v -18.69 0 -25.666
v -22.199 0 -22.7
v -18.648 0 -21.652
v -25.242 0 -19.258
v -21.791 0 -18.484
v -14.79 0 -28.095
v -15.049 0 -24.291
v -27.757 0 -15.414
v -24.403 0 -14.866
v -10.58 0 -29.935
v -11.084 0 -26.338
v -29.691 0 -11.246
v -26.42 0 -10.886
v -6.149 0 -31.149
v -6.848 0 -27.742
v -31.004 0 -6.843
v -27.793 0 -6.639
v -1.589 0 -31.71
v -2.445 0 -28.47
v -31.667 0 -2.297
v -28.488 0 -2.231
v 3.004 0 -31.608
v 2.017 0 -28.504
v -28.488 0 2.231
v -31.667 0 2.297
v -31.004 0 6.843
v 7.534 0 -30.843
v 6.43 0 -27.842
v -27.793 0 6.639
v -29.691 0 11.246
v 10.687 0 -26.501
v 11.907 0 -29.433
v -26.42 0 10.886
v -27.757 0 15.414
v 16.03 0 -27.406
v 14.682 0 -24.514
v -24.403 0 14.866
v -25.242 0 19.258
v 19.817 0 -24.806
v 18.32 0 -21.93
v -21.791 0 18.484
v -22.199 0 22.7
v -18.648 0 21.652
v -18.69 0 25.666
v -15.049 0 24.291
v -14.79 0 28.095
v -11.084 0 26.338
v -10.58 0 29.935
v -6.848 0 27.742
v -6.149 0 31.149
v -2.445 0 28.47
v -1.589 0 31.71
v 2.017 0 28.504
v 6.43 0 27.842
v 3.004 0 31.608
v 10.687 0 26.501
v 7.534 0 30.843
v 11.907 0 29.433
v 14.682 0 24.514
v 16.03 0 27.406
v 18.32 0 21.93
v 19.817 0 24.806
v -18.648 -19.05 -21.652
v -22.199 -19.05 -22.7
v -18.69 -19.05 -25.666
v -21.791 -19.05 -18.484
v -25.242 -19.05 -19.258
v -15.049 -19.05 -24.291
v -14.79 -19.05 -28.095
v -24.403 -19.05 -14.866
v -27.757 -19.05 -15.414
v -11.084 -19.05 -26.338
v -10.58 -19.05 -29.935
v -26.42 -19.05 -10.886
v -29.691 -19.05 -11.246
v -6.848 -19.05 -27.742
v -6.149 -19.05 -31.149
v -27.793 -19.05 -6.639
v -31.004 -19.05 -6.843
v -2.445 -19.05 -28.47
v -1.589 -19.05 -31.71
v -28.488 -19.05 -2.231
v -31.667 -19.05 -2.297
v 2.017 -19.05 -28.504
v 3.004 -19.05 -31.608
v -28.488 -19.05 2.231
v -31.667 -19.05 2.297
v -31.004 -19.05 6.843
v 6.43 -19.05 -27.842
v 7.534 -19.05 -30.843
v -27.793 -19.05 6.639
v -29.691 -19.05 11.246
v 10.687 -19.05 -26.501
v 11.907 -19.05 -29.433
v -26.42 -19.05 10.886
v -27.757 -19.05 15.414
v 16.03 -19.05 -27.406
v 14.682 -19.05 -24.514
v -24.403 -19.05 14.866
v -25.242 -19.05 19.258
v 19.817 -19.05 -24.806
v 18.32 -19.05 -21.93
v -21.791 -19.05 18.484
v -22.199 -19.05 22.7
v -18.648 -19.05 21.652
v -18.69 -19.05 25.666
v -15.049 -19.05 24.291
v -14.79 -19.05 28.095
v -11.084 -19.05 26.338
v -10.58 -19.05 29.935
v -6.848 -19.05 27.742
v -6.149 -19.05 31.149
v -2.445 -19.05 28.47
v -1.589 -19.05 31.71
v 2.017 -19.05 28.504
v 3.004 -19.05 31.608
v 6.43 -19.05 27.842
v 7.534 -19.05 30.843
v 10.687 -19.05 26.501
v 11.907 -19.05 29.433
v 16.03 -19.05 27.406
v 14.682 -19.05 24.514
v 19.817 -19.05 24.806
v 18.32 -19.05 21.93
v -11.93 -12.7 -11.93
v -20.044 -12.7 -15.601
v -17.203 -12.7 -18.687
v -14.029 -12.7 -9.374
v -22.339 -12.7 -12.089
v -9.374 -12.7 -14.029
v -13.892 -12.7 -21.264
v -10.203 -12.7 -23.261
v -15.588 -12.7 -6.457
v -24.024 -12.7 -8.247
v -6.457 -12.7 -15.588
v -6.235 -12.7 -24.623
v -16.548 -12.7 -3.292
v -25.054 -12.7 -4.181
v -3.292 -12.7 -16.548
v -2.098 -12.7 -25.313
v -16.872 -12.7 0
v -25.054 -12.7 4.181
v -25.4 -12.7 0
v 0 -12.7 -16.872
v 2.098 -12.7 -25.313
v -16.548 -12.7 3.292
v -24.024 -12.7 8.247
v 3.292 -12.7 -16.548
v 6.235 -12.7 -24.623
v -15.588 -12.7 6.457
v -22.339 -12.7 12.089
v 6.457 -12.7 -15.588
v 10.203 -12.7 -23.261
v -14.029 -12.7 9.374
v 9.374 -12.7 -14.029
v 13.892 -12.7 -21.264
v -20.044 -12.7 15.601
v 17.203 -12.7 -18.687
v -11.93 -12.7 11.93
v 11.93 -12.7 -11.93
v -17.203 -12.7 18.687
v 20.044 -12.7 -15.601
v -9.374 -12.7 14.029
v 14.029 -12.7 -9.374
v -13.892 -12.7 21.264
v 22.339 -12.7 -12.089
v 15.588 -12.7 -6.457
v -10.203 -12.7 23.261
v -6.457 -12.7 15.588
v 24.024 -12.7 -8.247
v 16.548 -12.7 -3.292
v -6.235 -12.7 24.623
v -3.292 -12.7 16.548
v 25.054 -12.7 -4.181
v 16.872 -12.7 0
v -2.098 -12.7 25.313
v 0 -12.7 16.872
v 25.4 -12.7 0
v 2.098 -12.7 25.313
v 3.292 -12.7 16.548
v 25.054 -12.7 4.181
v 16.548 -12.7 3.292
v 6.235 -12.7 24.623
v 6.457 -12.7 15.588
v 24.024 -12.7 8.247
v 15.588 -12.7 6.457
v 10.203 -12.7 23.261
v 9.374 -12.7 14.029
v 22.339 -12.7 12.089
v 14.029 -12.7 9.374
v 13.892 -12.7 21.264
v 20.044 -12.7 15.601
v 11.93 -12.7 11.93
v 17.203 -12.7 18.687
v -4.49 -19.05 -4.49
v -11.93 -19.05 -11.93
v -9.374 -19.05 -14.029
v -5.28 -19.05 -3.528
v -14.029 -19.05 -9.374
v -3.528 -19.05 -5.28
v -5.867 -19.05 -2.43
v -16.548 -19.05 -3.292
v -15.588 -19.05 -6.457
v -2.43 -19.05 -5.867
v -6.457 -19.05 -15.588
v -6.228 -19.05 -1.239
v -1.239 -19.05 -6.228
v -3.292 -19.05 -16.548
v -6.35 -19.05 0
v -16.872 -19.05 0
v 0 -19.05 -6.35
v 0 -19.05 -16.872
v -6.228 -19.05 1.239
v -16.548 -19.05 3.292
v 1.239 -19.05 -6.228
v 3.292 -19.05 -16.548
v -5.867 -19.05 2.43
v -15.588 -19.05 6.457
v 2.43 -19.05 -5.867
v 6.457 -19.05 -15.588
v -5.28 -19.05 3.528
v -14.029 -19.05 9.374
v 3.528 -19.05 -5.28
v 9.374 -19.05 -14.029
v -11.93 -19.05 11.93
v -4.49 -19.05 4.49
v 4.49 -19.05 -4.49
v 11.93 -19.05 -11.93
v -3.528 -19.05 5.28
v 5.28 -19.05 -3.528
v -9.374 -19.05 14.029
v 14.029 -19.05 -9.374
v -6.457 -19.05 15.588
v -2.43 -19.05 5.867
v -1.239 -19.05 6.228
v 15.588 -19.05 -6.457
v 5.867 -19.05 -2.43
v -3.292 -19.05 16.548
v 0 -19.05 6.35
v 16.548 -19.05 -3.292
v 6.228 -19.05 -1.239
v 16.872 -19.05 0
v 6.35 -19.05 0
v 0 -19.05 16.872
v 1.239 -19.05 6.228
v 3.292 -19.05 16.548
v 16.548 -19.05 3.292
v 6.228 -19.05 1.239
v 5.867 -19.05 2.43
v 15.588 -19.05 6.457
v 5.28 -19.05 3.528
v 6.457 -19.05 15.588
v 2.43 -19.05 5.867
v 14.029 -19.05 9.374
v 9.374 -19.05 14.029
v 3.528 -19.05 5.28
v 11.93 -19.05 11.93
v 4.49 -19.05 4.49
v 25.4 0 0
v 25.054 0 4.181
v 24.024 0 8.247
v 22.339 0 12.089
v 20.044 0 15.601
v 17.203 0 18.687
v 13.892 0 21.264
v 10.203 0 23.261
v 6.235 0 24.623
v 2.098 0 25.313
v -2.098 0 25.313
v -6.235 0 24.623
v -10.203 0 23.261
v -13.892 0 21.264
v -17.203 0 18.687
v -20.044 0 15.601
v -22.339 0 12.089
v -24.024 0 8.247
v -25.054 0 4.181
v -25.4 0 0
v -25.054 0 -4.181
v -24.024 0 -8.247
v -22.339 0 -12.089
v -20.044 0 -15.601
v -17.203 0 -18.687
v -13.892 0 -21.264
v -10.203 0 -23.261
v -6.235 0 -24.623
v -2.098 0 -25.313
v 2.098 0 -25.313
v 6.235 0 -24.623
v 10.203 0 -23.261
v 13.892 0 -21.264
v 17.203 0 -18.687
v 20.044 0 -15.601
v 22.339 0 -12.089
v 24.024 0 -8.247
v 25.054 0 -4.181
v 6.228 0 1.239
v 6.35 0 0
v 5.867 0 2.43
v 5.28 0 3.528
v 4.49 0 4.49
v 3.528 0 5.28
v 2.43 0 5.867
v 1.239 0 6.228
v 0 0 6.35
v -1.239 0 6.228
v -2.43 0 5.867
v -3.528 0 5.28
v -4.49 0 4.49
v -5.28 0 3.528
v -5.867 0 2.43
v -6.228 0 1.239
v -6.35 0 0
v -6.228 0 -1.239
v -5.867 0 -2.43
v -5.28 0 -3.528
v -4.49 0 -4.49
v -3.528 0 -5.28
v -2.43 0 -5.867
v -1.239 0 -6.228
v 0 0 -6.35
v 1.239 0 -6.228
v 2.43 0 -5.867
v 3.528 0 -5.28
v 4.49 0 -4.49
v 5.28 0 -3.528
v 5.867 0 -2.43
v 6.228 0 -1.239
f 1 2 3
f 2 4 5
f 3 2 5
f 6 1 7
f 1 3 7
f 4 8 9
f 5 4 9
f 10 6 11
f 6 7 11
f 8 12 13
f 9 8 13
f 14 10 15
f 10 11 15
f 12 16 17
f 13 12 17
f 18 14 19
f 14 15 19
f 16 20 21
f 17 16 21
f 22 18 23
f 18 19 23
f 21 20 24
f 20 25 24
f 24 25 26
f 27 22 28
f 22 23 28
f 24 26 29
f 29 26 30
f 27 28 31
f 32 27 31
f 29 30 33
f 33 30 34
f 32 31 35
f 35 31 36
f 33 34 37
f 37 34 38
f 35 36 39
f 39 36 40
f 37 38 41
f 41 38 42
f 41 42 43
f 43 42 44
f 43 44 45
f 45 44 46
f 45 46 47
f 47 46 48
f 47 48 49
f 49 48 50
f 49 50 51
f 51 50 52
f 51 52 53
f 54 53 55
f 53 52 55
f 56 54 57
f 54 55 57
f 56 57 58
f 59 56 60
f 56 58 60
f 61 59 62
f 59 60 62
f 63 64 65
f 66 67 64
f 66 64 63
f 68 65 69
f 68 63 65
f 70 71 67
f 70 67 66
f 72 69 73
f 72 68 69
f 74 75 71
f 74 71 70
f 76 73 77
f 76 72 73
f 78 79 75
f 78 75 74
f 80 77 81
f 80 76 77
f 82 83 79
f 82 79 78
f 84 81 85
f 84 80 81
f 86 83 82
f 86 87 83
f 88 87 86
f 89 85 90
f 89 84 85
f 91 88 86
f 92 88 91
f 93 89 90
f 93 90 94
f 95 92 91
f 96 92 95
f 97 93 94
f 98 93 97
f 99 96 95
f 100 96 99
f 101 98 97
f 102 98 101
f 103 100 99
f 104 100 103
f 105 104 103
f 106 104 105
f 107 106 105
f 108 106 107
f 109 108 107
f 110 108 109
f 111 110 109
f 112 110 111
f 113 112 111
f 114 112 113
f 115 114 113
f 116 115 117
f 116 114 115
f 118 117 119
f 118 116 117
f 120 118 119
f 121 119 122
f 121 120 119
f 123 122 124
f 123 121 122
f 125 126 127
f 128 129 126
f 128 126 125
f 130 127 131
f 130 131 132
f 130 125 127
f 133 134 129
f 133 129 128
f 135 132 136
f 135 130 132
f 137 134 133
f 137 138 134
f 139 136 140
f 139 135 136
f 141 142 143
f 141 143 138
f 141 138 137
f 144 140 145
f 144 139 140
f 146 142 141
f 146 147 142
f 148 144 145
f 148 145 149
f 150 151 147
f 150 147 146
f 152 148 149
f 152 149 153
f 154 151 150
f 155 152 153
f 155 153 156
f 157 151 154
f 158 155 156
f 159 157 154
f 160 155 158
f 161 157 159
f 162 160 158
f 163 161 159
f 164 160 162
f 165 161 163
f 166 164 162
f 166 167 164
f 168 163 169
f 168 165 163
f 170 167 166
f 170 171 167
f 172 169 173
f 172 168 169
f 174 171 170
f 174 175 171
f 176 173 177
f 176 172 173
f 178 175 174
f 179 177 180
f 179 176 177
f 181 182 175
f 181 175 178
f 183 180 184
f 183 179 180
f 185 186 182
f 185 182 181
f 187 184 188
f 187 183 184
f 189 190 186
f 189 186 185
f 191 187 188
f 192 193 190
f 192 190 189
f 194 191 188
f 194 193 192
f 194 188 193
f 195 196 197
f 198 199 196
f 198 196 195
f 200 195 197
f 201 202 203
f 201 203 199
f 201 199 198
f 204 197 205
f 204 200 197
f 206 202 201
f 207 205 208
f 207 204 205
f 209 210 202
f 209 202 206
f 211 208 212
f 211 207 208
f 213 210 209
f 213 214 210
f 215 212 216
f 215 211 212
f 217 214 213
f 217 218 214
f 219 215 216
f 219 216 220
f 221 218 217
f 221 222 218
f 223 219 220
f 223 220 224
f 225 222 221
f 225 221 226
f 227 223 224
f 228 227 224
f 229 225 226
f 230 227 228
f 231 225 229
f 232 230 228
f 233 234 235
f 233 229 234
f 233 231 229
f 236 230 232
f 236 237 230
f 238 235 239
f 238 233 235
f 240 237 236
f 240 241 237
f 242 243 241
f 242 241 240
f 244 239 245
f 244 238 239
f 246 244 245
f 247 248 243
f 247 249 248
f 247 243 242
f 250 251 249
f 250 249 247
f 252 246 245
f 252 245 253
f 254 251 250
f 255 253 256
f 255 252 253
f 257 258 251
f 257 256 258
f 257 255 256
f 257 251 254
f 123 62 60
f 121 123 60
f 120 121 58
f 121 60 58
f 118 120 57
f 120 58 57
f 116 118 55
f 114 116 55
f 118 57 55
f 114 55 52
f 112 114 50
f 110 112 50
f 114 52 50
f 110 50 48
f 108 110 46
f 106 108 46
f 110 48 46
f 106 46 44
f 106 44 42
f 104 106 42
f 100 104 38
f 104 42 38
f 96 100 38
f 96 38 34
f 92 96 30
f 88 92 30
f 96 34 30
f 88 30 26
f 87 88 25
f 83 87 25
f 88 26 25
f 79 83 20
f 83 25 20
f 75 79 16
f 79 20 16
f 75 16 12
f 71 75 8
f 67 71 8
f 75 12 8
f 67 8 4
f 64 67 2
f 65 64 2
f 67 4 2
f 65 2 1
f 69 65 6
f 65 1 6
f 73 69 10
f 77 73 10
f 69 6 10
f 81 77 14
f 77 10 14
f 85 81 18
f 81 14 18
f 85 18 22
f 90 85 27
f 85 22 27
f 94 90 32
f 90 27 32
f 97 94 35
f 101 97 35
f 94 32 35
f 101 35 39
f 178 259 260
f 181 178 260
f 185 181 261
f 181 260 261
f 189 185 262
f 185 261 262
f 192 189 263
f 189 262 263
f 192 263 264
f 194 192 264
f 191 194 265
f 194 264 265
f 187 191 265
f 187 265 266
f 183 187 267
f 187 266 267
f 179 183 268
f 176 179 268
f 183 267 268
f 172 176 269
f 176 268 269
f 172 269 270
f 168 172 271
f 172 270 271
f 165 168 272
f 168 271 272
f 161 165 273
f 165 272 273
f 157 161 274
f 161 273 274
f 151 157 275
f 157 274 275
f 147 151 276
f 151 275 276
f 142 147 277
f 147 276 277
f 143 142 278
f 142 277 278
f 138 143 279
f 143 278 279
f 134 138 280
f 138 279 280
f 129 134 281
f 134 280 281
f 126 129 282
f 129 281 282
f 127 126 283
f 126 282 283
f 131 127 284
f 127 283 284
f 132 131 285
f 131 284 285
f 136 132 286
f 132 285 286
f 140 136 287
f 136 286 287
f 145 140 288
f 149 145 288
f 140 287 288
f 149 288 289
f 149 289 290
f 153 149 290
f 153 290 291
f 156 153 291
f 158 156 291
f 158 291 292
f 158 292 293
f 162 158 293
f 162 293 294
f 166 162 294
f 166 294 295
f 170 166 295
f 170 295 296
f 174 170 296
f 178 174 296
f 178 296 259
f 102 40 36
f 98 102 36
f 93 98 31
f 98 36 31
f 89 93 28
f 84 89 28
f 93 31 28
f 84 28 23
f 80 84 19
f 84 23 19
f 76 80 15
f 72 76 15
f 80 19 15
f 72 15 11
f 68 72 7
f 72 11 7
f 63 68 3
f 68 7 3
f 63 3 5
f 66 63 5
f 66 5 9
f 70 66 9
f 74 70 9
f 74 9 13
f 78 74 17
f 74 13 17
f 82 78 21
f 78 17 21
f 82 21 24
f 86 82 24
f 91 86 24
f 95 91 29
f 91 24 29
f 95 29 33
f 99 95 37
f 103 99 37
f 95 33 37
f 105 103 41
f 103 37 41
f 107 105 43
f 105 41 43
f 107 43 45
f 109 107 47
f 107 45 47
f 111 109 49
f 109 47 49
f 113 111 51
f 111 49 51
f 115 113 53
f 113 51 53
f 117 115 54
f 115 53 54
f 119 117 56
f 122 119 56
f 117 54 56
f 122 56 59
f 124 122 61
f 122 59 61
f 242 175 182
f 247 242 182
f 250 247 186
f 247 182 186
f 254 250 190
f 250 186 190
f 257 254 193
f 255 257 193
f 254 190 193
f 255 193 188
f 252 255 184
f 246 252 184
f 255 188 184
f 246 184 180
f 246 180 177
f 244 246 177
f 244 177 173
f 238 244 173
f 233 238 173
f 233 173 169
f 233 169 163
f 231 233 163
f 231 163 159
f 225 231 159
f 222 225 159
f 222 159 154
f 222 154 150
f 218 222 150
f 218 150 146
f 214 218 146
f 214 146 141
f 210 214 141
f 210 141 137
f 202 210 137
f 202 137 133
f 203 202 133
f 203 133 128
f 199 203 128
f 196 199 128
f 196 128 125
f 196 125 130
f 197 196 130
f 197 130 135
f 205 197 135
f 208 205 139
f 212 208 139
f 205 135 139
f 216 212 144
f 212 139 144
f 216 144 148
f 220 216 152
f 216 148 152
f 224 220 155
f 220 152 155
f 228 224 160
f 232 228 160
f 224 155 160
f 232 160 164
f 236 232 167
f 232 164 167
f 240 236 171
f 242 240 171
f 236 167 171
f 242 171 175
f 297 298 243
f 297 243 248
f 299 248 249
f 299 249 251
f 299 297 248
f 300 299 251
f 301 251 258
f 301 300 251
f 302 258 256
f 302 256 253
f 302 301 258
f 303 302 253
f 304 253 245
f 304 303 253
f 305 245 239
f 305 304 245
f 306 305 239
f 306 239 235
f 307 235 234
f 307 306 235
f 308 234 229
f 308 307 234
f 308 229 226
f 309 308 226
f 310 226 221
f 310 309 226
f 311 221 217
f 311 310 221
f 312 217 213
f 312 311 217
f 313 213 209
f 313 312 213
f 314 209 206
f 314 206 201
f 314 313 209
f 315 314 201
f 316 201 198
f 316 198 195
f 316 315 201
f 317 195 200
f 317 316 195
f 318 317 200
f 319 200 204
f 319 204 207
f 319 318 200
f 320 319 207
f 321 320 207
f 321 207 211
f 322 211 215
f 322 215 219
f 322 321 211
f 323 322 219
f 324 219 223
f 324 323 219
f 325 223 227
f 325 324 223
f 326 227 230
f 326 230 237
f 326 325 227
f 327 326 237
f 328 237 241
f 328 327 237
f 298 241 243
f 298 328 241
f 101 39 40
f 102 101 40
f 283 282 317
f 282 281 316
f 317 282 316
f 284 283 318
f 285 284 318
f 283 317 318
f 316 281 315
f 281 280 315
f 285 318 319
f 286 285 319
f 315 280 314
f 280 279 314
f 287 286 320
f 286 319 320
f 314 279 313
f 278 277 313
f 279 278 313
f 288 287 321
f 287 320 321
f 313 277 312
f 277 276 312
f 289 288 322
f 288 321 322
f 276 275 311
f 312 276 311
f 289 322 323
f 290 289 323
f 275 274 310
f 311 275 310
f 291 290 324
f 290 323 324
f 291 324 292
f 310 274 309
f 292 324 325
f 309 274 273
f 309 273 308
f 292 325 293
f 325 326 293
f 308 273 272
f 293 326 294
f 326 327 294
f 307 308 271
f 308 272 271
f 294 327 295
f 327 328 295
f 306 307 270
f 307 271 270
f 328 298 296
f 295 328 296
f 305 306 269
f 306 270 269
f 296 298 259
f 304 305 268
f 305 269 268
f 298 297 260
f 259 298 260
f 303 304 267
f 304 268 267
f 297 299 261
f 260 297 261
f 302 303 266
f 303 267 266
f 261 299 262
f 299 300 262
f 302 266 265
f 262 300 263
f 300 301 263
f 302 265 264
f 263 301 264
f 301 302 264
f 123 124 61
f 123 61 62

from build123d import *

# Parameters (mm, degrees)
F0_R     = 25.4
F0_R_2   = 16.872111
F1_DEPTH = 12.7
F0_R_3   = 6.35
F2_DEPTH = 19.05
F4_DEPTH = 19.05


with BuildPart() as f1:
    # F0 (on Front) → F1 (new body)
    with BuildSketch(Plane.XZ):
        Circle(F0_R)
        Circle(F0_R_2, mode=Mode.SUBTRACT)
    extrude(amount=F1_DEPTH)

    # F0 (on Front) → F2 (join)
    with BuildSketch(Plane.XZ):
        Circle(F0_R_2)
        Circle(F0_R_3, mode=Mode.SUBTRACT)
    extrude(amount=F2_DEPTH)


with BuildPart() as f4:
    # F3 (on Front) → F4 (new body)
    with BuildSketch(Plane.XZ):
        with BuildLine():
            ThreePointArc((18.320052, -21.929576), (-28.575, 0), (18.320052, 21.929576))
            Line((18.320052, 21.929576), (19.817383, 24.805923))
            ThreePointArc((19.817383, 24.805923), (-31.75, 0), (19.817383, -24.805923))
            Line((19.817383, -24.805923), (18.320052, -21.929576))
        make_face()
    extrude(amount=F4_DEPTH)


solid = Compound([f1.part, f4.part])
